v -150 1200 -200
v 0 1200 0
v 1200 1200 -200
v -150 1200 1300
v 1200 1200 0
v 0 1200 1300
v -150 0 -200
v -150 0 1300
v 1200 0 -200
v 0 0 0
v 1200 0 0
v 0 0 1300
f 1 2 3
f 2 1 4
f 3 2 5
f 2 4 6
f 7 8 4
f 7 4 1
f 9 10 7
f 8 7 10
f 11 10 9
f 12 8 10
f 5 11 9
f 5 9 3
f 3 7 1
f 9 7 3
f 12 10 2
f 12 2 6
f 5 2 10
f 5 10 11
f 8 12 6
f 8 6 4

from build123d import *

# Parameters (mm, degrees)
F0_W     = 1200
F0_H     = 1200
F1_DEPTH = 200
F3_DEPTH = 1200


with BuildPart() as f1:
    # F0 (on Top) → F1 (new body)
    with BuildSketch(Plane.XY):
        with Locations((600, 600)):
            Rectangle(F0_W, F0_H)
    extrude(amount=-F1_DEPTH)

    # F2 (on face) → F3 (join)
    with BuildSketch(Plane.XZ):
        Polygon((-150, -200), (0, -200), (0, 0), (0, 1300), (-150, 1300), align=None)
    extrude(amount=-F3_DEPTH)


solid = f1.part
